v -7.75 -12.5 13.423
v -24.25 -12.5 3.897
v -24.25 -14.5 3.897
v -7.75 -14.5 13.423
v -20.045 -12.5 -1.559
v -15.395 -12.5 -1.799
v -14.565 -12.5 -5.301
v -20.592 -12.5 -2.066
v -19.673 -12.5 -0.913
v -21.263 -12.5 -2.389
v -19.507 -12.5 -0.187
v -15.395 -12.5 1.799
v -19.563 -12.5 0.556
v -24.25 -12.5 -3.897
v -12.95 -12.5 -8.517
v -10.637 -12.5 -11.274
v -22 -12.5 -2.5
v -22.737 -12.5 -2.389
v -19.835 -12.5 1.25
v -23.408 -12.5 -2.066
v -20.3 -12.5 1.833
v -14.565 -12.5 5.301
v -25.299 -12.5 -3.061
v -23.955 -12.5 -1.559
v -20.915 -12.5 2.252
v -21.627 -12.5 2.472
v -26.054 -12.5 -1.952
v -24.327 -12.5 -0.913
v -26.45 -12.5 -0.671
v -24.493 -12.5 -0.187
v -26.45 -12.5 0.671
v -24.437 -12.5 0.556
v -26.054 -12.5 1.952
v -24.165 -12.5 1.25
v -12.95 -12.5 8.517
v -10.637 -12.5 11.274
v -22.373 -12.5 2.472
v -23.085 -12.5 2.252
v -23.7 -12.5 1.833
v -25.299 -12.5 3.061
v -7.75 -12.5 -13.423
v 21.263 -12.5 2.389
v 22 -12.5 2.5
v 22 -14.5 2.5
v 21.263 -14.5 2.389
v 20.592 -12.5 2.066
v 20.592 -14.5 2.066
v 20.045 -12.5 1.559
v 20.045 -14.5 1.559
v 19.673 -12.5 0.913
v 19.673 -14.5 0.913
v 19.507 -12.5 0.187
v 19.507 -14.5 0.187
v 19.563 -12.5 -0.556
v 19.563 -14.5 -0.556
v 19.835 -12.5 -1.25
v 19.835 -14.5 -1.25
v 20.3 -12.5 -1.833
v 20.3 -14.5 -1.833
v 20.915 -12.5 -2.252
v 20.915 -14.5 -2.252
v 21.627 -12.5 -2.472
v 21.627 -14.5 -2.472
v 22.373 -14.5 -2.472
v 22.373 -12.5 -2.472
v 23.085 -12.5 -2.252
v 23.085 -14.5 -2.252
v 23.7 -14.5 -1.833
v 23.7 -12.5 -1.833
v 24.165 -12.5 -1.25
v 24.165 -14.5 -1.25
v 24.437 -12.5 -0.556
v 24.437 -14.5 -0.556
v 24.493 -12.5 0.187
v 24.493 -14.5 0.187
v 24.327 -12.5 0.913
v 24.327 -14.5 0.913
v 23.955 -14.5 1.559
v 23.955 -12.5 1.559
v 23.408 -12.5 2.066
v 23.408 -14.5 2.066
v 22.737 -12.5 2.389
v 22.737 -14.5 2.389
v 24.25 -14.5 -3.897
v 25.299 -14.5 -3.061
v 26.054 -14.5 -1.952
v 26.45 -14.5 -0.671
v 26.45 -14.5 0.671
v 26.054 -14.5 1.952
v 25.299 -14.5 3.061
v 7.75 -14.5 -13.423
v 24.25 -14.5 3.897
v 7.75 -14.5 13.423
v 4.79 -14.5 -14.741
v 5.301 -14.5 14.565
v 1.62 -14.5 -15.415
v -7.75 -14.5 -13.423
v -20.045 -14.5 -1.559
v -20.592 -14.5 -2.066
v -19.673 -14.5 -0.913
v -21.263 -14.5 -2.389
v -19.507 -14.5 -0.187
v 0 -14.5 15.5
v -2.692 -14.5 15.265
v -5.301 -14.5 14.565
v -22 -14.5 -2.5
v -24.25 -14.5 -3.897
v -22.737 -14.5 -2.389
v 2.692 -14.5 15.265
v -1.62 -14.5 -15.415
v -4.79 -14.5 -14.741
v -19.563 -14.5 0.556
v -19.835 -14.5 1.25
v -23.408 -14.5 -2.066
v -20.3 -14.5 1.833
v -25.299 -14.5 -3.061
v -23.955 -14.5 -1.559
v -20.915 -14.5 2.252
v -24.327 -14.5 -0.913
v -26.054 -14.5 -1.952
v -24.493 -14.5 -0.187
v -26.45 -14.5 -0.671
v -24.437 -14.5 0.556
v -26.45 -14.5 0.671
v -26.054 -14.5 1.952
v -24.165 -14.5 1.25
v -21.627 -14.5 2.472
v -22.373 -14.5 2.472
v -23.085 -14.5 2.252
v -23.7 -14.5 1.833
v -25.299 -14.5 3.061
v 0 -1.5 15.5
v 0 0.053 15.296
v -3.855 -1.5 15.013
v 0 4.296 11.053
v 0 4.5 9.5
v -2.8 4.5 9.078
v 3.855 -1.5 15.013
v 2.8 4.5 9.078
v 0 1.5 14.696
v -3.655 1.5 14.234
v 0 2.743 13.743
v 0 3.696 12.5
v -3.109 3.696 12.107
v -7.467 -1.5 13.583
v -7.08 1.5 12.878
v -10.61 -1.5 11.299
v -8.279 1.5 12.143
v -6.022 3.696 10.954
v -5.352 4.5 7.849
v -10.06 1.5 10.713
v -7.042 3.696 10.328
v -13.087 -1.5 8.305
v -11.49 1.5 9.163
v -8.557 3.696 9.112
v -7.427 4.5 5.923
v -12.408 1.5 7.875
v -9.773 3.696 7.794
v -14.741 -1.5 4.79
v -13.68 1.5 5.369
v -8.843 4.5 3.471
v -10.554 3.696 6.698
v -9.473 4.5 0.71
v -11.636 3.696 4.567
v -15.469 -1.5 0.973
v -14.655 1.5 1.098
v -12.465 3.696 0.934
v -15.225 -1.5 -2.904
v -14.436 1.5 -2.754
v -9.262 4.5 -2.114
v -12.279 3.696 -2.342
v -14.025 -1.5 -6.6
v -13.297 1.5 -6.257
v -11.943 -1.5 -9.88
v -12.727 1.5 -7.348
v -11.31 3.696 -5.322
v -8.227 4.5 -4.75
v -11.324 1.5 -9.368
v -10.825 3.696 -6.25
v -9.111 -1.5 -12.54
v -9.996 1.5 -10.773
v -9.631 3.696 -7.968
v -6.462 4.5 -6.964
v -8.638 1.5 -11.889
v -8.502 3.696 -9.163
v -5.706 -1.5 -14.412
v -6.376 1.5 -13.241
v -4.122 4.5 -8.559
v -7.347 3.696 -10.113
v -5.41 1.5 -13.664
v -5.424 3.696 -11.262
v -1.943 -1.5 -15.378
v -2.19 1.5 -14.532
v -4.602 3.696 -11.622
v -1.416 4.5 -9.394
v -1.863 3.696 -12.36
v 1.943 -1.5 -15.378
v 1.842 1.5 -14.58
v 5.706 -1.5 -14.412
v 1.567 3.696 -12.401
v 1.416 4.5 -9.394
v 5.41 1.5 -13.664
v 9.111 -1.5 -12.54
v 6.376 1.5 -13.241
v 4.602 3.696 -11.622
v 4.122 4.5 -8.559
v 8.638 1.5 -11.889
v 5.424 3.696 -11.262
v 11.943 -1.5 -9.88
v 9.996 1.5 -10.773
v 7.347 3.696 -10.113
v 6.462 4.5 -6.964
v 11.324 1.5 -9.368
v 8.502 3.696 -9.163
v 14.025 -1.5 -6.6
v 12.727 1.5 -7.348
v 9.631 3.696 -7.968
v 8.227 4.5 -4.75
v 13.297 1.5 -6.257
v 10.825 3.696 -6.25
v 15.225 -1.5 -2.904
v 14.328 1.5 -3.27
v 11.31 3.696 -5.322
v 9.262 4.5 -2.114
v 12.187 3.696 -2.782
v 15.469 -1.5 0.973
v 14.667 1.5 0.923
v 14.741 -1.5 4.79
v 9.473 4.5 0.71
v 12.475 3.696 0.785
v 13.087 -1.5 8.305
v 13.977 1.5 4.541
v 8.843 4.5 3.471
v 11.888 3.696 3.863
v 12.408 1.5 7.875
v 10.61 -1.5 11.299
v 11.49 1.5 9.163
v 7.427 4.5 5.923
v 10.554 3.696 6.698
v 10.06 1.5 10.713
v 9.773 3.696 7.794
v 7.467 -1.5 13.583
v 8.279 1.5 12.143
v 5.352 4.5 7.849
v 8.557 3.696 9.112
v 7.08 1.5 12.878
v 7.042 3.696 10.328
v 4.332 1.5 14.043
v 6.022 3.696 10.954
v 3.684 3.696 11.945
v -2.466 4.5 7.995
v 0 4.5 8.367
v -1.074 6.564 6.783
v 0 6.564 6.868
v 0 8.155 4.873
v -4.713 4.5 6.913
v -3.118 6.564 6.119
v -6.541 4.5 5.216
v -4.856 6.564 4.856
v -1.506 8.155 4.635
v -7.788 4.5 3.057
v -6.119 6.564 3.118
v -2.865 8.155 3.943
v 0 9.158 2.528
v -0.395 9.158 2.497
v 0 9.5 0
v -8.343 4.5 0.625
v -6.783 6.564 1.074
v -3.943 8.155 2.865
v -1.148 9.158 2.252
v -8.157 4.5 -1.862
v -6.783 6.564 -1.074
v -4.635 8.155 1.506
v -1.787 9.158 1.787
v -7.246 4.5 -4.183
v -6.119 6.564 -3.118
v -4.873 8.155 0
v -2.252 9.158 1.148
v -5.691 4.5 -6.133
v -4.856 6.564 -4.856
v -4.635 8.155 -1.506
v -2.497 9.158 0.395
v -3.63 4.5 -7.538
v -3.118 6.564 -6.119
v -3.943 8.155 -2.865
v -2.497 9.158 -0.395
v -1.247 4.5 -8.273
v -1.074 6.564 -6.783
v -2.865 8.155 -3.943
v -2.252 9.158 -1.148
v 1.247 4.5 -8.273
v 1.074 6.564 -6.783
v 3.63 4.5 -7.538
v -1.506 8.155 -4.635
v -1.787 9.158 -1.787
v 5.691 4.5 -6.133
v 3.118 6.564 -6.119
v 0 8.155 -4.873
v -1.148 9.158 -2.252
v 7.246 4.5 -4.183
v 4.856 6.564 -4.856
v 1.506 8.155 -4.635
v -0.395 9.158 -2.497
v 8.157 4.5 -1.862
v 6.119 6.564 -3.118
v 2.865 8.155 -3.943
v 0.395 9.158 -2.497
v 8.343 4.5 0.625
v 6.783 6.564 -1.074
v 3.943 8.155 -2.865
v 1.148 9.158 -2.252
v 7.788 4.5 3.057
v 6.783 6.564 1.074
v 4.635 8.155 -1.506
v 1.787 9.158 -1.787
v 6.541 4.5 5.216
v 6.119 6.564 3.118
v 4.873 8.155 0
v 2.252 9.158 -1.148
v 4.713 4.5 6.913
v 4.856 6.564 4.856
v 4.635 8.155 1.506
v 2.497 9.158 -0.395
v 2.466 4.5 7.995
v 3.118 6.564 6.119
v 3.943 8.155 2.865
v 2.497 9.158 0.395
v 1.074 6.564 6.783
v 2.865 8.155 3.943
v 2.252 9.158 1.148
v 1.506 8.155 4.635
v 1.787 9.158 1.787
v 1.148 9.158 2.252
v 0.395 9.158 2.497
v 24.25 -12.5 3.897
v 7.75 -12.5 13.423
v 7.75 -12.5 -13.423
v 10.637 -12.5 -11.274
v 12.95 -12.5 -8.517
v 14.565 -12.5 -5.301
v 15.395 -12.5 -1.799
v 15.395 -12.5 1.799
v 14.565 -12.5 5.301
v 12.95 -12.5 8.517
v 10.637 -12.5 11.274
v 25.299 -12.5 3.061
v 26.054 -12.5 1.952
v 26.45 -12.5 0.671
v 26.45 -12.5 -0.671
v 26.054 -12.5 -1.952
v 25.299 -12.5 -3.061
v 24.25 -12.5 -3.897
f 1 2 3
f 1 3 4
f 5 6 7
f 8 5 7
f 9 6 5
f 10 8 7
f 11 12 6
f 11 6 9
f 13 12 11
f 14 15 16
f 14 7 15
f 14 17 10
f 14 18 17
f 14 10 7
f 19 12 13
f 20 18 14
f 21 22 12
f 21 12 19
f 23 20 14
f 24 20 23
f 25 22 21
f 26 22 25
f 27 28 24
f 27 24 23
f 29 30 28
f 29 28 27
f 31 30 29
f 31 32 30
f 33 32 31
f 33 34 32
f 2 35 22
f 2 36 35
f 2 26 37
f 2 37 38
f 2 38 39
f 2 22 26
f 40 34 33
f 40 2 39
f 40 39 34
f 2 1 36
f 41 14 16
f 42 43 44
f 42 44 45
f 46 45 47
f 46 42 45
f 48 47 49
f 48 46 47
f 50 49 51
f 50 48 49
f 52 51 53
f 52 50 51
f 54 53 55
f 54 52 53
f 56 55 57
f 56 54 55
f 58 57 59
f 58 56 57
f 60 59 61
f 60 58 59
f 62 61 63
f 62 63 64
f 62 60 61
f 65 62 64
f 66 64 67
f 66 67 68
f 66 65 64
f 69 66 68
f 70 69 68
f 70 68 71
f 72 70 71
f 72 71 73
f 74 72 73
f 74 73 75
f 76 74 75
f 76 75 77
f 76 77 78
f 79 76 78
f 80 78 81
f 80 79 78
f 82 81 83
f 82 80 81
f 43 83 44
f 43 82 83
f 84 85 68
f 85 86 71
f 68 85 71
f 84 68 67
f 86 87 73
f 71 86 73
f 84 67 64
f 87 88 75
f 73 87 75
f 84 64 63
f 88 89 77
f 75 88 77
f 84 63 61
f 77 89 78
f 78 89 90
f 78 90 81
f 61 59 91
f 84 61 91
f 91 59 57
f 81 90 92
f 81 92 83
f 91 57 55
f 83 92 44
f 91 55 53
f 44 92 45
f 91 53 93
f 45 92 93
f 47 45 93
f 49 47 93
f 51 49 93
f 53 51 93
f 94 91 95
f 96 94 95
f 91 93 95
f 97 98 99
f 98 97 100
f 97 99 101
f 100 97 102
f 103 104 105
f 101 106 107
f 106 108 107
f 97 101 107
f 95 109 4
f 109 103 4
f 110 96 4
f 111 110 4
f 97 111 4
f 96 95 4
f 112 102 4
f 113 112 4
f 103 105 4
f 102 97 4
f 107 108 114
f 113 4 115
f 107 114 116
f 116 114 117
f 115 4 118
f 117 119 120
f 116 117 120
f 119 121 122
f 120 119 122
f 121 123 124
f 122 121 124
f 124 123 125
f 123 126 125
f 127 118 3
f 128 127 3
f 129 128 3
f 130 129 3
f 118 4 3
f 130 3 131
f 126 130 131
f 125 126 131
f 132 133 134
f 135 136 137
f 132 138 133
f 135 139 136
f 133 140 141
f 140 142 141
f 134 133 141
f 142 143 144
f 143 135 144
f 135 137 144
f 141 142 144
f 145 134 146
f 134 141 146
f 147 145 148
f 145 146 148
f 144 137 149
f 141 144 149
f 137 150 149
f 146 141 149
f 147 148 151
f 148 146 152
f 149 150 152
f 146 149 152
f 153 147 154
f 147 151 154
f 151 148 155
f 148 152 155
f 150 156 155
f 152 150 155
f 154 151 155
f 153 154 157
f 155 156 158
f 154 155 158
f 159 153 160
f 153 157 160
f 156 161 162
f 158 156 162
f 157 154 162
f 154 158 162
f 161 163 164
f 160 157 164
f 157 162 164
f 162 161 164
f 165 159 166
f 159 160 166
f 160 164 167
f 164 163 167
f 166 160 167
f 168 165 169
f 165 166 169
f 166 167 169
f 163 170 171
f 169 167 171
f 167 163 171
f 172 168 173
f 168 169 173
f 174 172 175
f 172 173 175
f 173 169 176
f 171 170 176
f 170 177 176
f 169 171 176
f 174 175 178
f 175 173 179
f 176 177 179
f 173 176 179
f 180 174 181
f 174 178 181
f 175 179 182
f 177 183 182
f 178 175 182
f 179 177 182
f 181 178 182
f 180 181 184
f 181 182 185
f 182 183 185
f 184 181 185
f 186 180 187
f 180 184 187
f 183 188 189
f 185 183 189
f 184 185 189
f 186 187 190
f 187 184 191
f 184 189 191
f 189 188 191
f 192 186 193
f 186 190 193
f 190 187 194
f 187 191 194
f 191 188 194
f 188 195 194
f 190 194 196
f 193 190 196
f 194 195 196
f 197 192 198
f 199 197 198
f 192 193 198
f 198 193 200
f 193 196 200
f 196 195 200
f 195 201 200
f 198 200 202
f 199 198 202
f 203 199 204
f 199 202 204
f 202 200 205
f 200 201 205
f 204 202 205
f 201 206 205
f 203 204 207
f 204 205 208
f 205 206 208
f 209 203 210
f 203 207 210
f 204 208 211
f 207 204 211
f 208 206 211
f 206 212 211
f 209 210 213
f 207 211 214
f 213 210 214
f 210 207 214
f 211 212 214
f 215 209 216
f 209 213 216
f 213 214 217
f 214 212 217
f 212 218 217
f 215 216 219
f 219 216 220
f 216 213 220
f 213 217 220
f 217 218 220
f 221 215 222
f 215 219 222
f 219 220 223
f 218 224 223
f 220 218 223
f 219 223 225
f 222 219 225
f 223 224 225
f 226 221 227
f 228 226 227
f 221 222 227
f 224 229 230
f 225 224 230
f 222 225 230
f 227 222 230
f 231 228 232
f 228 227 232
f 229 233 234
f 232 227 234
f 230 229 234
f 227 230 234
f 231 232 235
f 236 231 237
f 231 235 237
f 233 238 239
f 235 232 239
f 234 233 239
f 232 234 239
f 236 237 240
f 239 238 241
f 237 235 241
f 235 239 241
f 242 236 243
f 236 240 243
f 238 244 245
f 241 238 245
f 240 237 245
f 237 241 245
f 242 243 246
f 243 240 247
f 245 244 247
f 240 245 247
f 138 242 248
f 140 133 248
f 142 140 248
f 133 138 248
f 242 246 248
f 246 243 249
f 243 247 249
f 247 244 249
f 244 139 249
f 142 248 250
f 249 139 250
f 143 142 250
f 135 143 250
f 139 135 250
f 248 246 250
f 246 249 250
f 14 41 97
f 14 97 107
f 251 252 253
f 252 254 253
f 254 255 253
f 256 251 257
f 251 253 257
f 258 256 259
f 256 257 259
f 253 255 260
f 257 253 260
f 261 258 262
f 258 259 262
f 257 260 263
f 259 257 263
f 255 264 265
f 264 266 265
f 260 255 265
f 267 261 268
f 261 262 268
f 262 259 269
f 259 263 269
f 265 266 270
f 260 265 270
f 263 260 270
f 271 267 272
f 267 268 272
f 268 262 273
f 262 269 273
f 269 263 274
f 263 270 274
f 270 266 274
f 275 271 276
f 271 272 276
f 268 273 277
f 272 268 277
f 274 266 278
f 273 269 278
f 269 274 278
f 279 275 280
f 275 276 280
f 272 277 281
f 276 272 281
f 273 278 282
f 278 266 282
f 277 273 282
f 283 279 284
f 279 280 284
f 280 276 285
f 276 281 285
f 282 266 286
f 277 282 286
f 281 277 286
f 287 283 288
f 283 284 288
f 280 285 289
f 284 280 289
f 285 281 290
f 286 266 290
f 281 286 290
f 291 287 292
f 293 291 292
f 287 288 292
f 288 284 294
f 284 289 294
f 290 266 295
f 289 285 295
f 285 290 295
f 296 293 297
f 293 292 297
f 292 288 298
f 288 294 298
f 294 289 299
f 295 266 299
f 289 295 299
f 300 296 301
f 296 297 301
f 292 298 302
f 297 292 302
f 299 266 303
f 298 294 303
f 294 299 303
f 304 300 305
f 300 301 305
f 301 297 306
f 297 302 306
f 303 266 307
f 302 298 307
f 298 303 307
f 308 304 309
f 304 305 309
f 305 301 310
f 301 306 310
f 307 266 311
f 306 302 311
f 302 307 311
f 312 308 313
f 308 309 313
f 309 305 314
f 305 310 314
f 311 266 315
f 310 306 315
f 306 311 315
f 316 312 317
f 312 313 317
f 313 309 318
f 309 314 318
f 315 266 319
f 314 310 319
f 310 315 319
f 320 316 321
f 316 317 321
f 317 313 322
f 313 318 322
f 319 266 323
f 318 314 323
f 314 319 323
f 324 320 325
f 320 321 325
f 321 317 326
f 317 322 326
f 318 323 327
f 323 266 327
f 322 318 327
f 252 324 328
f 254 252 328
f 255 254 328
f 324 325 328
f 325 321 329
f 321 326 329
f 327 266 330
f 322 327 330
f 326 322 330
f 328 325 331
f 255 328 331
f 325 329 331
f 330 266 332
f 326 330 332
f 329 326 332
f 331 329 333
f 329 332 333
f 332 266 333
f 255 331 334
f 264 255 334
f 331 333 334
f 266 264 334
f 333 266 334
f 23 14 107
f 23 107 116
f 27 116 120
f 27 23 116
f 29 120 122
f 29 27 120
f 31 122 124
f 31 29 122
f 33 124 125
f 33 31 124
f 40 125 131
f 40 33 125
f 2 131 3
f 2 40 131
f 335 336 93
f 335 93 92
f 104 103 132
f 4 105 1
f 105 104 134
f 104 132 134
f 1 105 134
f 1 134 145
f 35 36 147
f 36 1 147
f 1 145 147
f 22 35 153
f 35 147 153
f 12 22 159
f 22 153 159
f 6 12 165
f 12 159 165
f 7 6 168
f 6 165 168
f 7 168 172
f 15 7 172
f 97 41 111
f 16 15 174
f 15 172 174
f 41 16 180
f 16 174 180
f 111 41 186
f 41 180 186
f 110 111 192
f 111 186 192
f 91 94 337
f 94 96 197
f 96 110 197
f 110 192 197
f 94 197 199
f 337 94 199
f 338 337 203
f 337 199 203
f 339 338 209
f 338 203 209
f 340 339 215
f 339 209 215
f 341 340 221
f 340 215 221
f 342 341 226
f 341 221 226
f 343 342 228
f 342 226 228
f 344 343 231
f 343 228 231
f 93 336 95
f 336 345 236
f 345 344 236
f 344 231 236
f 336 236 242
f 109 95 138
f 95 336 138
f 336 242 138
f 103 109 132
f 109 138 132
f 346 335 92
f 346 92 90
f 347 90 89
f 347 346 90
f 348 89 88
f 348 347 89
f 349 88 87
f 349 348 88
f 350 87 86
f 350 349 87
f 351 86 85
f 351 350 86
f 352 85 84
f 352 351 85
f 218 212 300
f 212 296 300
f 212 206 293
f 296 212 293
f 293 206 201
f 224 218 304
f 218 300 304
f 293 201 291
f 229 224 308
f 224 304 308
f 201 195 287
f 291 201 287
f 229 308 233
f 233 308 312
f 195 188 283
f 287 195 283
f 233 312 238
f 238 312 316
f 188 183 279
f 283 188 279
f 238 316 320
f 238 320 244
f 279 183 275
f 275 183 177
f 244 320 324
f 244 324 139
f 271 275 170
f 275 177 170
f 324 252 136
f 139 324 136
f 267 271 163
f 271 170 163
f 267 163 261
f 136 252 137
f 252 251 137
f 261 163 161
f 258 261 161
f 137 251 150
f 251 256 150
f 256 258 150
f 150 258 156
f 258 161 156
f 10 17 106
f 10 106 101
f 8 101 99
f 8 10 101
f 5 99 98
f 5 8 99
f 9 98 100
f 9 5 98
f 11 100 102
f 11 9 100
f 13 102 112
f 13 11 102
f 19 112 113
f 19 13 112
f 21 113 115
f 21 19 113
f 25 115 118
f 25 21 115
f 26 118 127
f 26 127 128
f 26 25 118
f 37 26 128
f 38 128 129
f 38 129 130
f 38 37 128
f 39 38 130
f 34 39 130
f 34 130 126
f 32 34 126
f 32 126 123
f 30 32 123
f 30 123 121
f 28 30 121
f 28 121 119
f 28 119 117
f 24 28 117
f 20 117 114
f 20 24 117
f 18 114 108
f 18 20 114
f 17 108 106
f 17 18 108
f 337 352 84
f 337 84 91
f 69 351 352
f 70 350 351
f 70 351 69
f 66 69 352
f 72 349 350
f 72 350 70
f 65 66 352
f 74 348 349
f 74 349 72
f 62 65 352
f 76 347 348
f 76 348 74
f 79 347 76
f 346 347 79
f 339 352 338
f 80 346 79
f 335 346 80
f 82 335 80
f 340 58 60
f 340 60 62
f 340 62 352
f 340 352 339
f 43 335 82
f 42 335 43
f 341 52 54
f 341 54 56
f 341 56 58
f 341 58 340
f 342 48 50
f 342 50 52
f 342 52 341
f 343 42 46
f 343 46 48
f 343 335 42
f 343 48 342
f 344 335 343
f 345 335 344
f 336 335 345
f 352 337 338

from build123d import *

# Parameters (mm, degrees)
EXTRUDE_START   = -2
SKETCH_2_R      = 2.5
EXTRUDE_1_DEPTH = 2


with BuildPart() as part:
    # 草图1 → 旋转1 (revolve)
    with BuildSketch(Plane.XY, mode=Mode.PRIVATE) as revolve_1_sk:
        with BuildLine():
            Line((0, -14.5), (15.5, -14.5))
            Line((15.5, -14.5), (15.5, -1.5))
            ThreePointArc((15.5, -1.5), (13.742640687, 2.742640687), (9.5, 4.5))
            Line((9.5, 4.5), (8.366600265, 4.5))
            ThreePointArc((8.366600265, 4.5), (4.873397172, 8.154753215), (0, 9.5))
            Line((0, 9.5), (0, -14.5))
        make_face()
    revolve(revolve_1_sk.sketch.rotate(Axis((0, 9.5, 0), (0, -1, 0)), 90), axis=Axis((0, 9.5, 0), (0, -1, 0)))

    # 草图2 → 凸台-拉伸1 (add)
    with BuildSketch(Plane.XZ.offset(14.5).offset(EXTRUDE_START)):
        with BuildLine():
            Line((-24.25, 3.897114317), (-7.75, 13.423393759))
            ThreePointArc((-7.75, 13.423393759), (0, 15.5), (7.75, 13.423393759))
            Line((7.75, 13.423393759), (24.25, 3.897114317))
            ThreePointArc((24.25, 3.897114317), (26.5, 0), (24.25, -3.897114317))
            Line((24.25, -3.897114317), (7.75, -13.423393759))
            ThreePointArc((7.75, -13.423393759), (0, -15.5), (-7.75, -13.423393759))
            Line((-7.75, -13.423393759), (-24.25, -3.897114317))
            ThreePointArc((-24.25, -3.897114317), (-26.5, 0), (-24.25, 3.897114317))
        make_face()
        with Locations(Location((-22, 0, 0), (0, 0, 270))):
            Circle(SKETCH_2_R, mode=Mode.SUBTRACT)
        with Locations(Location((22, 0, 0), (0, 0, 90))):
            Circle(SKETCH_2_R, mode=Mode.SUBTRACT)
    extrude(amount=EXTRUDE_1_DEPTH)


solid = part.part
